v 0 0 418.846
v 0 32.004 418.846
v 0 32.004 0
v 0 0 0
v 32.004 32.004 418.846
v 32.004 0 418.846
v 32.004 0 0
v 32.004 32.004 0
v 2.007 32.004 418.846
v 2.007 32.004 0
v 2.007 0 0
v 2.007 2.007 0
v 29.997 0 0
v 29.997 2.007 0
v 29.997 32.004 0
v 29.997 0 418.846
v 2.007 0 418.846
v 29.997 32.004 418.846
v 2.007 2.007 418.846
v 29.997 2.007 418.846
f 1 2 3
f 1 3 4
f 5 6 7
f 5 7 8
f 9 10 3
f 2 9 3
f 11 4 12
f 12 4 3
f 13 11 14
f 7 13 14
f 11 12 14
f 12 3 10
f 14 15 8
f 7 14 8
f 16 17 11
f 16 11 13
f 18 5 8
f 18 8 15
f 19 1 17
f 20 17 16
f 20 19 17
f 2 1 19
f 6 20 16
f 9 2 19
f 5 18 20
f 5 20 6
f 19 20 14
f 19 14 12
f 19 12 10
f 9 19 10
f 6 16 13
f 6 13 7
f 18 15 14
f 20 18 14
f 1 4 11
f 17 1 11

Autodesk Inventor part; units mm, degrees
ref_plane "YZ Plane" through (0, 0, 0) normal (1, 0, 0) x (0, 1, 0)
ref_plane "XZ Plane" through (0, 0, 0) normal (0, 1, 0) x (-1, 0, 0)
ref_plane "XY Plane" through (0, 0, 0) normal (0, 0, 1) x (1, 0, 0)
sketch "Sketch1" plane through (0, 0, 0) normal (0, 0, 1) x (1, 0, 0)
  line L0 (2.0066, 32.004) -> (0, 32.004)
  line L1 (0, 32.004) -> (0, 0)
  line L2 (0, 0) -> (2.0066, 0)
  line L3 (2.0066, 2.0066) -> (2.0066, 32.004)
  line L4 (2.0066, 0) -> (29.9974, 0)
  line L5 (29.9974, 2.0066) -> (2.0066, 2.0066)
  line L6 (29.9974, 0) -> (32.004, 0)
  line L7 (32.004, 0) -> (32.004, 32.004)
  line L8 (32.004, 32.004) -> (29.9974, 32.004)
  line L9 (29.9974, 32.004) -> (29.9974, 2.0066)
  dimension "d2" = 2.0066
  dimension "d3" = 32.004
sketch "Sketch2" plane through (0, 0, 0) normal (0, 0, 1) x (1, 0, 0)
  point P0 (0, 0)
extrude "Extrusion1" add sketch "Sketch1" along normal blind 418.846
properties part number "USEsolid7andsomething"
